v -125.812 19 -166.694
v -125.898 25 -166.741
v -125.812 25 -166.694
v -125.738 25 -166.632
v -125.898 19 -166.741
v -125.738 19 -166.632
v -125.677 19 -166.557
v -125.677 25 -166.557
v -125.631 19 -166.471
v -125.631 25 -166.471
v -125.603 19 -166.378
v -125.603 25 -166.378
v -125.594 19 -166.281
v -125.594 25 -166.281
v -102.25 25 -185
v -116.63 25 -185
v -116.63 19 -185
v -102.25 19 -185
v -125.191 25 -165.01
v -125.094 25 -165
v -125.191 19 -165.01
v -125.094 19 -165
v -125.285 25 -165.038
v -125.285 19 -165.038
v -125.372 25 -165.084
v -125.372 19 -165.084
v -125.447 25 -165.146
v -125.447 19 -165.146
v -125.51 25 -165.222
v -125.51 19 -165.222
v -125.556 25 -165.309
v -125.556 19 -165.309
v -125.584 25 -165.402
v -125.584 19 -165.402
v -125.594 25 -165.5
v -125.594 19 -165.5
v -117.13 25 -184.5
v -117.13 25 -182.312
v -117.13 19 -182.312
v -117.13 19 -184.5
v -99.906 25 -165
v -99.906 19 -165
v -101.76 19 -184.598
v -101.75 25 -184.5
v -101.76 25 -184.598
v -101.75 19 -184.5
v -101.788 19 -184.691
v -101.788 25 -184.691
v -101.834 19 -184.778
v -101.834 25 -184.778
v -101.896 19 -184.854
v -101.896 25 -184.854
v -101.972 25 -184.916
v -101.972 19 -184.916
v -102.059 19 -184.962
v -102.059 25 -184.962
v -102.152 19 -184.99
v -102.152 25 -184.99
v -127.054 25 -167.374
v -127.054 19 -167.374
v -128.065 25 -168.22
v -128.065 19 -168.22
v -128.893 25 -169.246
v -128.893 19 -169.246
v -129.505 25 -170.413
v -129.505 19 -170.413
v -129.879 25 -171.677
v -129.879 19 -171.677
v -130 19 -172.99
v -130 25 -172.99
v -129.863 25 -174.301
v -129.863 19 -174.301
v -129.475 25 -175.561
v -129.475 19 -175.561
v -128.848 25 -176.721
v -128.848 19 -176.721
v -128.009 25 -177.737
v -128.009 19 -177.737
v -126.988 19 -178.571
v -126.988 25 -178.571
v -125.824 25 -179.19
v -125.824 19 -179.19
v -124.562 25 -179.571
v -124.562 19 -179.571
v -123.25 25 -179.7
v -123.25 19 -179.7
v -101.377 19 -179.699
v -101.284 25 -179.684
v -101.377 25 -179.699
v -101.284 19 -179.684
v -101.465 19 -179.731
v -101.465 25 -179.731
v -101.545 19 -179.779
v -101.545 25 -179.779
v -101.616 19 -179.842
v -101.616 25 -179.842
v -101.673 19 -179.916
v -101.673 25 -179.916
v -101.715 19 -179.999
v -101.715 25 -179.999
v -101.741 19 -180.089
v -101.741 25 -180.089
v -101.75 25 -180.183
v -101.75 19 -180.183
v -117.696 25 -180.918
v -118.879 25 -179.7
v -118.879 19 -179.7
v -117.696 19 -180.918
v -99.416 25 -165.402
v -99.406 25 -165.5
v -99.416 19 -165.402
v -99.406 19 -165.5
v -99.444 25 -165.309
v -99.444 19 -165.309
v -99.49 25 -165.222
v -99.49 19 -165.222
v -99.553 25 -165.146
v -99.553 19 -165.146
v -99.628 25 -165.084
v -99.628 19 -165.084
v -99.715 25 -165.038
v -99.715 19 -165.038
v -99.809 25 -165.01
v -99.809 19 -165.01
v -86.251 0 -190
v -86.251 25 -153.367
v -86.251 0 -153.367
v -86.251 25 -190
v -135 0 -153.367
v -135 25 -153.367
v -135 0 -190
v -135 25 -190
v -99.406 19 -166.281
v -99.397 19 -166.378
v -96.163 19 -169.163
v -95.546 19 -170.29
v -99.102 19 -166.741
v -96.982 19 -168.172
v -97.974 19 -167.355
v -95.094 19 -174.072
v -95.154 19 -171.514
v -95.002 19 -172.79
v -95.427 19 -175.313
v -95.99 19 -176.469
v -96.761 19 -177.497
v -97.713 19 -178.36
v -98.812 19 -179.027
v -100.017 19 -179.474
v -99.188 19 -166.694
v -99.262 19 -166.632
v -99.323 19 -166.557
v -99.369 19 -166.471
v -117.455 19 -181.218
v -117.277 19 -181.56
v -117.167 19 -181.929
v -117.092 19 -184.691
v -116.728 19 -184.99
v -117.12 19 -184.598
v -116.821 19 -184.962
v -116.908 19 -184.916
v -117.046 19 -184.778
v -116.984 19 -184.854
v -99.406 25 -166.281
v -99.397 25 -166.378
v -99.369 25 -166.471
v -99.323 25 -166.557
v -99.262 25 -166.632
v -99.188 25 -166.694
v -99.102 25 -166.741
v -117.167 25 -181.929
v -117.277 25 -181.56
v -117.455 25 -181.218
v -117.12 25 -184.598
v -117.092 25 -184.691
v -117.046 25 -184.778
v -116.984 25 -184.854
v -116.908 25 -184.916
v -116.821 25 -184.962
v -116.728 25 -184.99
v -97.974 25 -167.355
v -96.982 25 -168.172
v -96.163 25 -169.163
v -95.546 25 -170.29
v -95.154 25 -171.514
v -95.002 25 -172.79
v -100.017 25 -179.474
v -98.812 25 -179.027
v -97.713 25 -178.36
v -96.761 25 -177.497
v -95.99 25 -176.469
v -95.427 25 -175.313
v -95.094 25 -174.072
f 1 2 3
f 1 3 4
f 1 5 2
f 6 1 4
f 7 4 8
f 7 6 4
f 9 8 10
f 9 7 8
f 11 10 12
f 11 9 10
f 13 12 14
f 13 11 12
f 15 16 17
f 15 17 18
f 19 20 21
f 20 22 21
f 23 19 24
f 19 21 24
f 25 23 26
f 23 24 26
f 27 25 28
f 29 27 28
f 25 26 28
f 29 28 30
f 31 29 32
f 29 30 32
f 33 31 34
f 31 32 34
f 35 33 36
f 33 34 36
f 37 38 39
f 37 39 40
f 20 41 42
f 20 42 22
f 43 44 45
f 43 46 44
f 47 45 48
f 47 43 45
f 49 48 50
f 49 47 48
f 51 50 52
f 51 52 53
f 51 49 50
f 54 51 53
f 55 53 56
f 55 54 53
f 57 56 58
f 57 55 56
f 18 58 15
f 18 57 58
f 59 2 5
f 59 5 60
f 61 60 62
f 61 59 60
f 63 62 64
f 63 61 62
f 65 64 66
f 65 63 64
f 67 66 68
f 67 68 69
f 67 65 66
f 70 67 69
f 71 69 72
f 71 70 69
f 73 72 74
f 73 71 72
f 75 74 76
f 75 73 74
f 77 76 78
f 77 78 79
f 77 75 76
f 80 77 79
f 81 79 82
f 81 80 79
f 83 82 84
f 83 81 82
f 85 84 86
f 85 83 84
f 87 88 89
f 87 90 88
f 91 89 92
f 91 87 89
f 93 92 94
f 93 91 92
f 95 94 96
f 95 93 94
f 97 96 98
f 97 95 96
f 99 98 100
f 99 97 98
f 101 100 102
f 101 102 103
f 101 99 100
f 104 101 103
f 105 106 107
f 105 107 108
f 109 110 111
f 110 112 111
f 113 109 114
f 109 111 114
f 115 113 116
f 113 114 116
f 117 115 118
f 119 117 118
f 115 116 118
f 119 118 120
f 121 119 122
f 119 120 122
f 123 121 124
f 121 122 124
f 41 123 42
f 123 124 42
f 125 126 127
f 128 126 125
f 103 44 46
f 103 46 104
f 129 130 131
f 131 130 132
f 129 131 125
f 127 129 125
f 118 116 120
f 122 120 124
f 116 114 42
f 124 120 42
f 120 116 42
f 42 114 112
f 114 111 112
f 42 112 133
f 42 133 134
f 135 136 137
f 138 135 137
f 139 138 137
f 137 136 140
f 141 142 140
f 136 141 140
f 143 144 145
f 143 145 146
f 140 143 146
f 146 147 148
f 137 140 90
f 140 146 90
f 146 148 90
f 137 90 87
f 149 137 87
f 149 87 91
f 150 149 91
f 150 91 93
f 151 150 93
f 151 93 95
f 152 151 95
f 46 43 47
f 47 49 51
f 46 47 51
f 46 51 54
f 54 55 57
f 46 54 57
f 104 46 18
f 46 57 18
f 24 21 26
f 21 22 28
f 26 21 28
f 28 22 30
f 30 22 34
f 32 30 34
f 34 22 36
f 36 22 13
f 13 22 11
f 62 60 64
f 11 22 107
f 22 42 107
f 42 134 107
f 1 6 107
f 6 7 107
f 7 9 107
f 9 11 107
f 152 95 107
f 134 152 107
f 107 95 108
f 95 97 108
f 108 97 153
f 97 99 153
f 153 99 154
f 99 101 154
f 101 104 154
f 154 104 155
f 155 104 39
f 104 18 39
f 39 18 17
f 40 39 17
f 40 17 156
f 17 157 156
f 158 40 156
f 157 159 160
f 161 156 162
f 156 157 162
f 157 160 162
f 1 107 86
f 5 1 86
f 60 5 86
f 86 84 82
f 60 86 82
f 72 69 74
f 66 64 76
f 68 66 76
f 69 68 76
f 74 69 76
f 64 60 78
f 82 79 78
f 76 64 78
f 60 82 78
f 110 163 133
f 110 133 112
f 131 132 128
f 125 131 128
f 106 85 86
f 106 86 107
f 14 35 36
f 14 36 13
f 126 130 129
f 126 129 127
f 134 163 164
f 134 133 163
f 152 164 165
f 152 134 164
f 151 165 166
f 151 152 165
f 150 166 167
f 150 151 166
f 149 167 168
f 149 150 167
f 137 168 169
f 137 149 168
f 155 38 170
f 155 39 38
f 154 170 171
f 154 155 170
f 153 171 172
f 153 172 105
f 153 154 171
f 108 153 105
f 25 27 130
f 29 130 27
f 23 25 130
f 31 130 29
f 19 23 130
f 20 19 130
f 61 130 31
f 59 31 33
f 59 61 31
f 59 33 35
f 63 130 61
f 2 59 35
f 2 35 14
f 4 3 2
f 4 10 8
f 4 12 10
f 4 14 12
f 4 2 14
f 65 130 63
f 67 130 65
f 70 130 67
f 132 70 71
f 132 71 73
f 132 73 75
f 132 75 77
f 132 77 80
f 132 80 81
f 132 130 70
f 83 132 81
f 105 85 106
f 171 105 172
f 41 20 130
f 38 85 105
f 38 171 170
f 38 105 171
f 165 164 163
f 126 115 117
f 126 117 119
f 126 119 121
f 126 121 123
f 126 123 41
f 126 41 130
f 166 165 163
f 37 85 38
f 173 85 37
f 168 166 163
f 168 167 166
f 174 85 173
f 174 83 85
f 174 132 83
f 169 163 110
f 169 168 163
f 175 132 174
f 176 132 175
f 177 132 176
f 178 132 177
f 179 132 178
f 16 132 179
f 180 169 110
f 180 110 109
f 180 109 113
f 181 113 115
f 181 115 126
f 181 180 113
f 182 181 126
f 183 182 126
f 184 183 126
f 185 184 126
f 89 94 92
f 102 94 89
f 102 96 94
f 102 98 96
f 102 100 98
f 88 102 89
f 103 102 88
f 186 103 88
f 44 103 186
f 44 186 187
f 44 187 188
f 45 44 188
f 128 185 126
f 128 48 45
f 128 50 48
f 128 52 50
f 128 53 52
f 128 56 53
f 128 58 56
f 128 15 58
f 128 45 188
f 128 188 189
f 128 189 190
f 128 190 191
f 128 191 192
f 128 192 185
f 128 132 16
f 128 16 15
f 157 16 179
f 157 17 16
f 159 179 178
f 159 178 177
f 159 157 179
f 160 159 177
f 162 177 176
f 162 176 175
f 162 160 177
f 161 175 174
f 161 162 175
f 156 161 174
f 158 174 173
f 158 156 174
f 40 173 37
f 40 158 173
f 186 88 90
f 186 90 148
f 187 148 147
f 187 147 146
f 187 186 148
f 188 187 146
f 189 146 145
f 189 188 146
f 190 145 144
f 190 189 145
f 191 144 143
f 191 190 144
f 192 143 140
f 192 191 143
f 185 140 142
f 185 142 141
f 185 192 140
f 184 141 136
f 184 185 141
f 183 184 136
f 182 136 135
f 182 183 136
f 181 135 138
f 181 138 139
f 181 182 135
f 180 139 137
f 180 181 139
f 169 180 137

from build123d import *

# Parameters (mm, degrees)
SKETCH1_W           = 290
SKETCH1_H           = 400
BOSS_EXTRUDE1_DEPTH = 35
SKETCH2_W           = 270
SKETCH2_H           = 380
CUT_EXTRUDE2_DEPTH  = 10
CUT_EXTRUDE3_DEPTH  = 6
FILLET2_R           = 2
FILLET4_R           = 0.5
FILLET5_R           = 0.5
FILLET6_R           = 0.5
FILLET7_R           = 0.5
FILLET8_R           = 0.5
FILLET9_R           = 0.5
SKETCH4_W           = 290
SKETCH4_H           = 400
SKETCH4_W_2         = 48.749470761
SKETCH4_H_2         = 36.632728687
CUT_EXTRUDE4_DEPTH  = 250.499498997


with BuildPart() as part:
    # Sketch1 → Boss-Extrude1 (new body)
    with BuildSketch(Plane(origin=(0, 0, 0), x_dir=(1, 0, 0), z_dir=(0, 1, 0))):
        Rectangle(SKETCH1_W, SKETCH1_H)
    extrude(amount=BOSS_EXTRUDE1_DEPTH)

    # Sketch2 → Cut-Extrude2 (cut)
    with BuildSketch(Plane(origin=(0, 35, 0), x_dir=(1, 0, 0), z_dir=(0, 1, 0))):
        Rectangle(SKETCH2_W, SKETCH2_H)
    extrude(amount=-CUT_EXTRUDE2_DEPTH, mode=Mode.SUBTRACT)

    # Sketch3 → Cut-Extrude3 (cut)
    with BuildSketch(Plane(origin=(0, 25, 0), x_dir=(1, 0, 0), z_dir=(0, 1, 0))):
        with BuildLine():
            Line((-101.75, 185), (-117.13, 185))
            Line((-117.13, 185), (-117.13, 181.5))
            Line((-117.13, 181.5), (-118.879314151, 179.7))
            Line((-118.879314151, 179.7), (-123.25, 179.7))
            ThreePointArc((-123.25, 179.7), (-129.894170377, 174.14058809), (-125.593842998, 166.62))
            Line((-125.593842998, 166.62), (-125.593842998, 165))
            Line((-125.593842998, 165), (-99.406157002, 165))
            Line((-99.406157002, 165), (-99.406157002, 166.62))
            ThreePointArc((-99.406157002, 166.62), (-95.105829623, 174.14058809), (-101.75, 179.7))
            Line((-101.75, 179.7), (-101.75, 185))
        make_face()
    extrude(amount=-CUT_EXTRUDE3_DEPTH, mode=Mode.SUBTRACT)

    # Fillet2
    fillet2_edges = [part.edges().sort_by_distance(p)[0] for p in [
        (-117.13, 22, -181.5),
    ]]
    fillet(fillet2_edges, radius=FILLET2_R)

    # Fillet4
    fillet4_edges = [part.edges().sort_by_distance(p)[0] for p in [
        (-125.593842998, 22, -166.62),
    ]]
    fillet(fillet4_edges, radius=FILLET4_R)

    # Fillet5
    fillet5_edges = [part.edges().sort_by_distance(p)[0] for p in [
        (-99.406157002, 22, -166.62),
    ]]
    fillet(fillet5_edges, radius=FILLET5_R)

    # Fillet6
    fillet6_edges = [part.edges().sort_by_distance(p)[0] for p in [
        (-101.75, 22, -179.7),
    ]]
    fillet(fillet6_edges, radius=FILLET6_R)

    # Fillet7
    fillet7_edges = [part.edges().sort_by_distance(p)[0] for p in [
        (-101.75, 22, -185),
    ]]
    fillet(fillet7_edges, radius=FILLET7_R)

    # Fillet8
    fillet8_edges = [part.edges().sort_by_distance(p)[0] for p in [
        (-117.13, 22, -185),
    ]]
    fillet(fillet8_edges, radius=FILLET8_R)

    # Fillet9
    fillet9_edges = [part.edges().sort_by_distance(p)[0] for p in [
        (-125.593842998, 22, -165),
        (-99.406157002, 22, -165),
    ]]
    fillet(fillet9_edges, radius=FILLET9_R)

    # Sketch4 → Cut-Extrude4 (cut, through all)
    with BuildSketch(Plane(origin=(0, 35, 0), x_dir=(1, 0, 0), z_dir=(0, 1, 0))):
        Rectangle(SKETCH4_W, SKETCH4_H)
        with Locations((-110.62526462, 171.683635657)):
            Rectangle(SKETCH4_W_2, SKETCH4_H_2, mode=Mode.SUBTRACT)
    extrude(amount=-CUT_EXTRUDE4_DEPTH, mode=Mode.SUBTRACT)


solid = part.part
